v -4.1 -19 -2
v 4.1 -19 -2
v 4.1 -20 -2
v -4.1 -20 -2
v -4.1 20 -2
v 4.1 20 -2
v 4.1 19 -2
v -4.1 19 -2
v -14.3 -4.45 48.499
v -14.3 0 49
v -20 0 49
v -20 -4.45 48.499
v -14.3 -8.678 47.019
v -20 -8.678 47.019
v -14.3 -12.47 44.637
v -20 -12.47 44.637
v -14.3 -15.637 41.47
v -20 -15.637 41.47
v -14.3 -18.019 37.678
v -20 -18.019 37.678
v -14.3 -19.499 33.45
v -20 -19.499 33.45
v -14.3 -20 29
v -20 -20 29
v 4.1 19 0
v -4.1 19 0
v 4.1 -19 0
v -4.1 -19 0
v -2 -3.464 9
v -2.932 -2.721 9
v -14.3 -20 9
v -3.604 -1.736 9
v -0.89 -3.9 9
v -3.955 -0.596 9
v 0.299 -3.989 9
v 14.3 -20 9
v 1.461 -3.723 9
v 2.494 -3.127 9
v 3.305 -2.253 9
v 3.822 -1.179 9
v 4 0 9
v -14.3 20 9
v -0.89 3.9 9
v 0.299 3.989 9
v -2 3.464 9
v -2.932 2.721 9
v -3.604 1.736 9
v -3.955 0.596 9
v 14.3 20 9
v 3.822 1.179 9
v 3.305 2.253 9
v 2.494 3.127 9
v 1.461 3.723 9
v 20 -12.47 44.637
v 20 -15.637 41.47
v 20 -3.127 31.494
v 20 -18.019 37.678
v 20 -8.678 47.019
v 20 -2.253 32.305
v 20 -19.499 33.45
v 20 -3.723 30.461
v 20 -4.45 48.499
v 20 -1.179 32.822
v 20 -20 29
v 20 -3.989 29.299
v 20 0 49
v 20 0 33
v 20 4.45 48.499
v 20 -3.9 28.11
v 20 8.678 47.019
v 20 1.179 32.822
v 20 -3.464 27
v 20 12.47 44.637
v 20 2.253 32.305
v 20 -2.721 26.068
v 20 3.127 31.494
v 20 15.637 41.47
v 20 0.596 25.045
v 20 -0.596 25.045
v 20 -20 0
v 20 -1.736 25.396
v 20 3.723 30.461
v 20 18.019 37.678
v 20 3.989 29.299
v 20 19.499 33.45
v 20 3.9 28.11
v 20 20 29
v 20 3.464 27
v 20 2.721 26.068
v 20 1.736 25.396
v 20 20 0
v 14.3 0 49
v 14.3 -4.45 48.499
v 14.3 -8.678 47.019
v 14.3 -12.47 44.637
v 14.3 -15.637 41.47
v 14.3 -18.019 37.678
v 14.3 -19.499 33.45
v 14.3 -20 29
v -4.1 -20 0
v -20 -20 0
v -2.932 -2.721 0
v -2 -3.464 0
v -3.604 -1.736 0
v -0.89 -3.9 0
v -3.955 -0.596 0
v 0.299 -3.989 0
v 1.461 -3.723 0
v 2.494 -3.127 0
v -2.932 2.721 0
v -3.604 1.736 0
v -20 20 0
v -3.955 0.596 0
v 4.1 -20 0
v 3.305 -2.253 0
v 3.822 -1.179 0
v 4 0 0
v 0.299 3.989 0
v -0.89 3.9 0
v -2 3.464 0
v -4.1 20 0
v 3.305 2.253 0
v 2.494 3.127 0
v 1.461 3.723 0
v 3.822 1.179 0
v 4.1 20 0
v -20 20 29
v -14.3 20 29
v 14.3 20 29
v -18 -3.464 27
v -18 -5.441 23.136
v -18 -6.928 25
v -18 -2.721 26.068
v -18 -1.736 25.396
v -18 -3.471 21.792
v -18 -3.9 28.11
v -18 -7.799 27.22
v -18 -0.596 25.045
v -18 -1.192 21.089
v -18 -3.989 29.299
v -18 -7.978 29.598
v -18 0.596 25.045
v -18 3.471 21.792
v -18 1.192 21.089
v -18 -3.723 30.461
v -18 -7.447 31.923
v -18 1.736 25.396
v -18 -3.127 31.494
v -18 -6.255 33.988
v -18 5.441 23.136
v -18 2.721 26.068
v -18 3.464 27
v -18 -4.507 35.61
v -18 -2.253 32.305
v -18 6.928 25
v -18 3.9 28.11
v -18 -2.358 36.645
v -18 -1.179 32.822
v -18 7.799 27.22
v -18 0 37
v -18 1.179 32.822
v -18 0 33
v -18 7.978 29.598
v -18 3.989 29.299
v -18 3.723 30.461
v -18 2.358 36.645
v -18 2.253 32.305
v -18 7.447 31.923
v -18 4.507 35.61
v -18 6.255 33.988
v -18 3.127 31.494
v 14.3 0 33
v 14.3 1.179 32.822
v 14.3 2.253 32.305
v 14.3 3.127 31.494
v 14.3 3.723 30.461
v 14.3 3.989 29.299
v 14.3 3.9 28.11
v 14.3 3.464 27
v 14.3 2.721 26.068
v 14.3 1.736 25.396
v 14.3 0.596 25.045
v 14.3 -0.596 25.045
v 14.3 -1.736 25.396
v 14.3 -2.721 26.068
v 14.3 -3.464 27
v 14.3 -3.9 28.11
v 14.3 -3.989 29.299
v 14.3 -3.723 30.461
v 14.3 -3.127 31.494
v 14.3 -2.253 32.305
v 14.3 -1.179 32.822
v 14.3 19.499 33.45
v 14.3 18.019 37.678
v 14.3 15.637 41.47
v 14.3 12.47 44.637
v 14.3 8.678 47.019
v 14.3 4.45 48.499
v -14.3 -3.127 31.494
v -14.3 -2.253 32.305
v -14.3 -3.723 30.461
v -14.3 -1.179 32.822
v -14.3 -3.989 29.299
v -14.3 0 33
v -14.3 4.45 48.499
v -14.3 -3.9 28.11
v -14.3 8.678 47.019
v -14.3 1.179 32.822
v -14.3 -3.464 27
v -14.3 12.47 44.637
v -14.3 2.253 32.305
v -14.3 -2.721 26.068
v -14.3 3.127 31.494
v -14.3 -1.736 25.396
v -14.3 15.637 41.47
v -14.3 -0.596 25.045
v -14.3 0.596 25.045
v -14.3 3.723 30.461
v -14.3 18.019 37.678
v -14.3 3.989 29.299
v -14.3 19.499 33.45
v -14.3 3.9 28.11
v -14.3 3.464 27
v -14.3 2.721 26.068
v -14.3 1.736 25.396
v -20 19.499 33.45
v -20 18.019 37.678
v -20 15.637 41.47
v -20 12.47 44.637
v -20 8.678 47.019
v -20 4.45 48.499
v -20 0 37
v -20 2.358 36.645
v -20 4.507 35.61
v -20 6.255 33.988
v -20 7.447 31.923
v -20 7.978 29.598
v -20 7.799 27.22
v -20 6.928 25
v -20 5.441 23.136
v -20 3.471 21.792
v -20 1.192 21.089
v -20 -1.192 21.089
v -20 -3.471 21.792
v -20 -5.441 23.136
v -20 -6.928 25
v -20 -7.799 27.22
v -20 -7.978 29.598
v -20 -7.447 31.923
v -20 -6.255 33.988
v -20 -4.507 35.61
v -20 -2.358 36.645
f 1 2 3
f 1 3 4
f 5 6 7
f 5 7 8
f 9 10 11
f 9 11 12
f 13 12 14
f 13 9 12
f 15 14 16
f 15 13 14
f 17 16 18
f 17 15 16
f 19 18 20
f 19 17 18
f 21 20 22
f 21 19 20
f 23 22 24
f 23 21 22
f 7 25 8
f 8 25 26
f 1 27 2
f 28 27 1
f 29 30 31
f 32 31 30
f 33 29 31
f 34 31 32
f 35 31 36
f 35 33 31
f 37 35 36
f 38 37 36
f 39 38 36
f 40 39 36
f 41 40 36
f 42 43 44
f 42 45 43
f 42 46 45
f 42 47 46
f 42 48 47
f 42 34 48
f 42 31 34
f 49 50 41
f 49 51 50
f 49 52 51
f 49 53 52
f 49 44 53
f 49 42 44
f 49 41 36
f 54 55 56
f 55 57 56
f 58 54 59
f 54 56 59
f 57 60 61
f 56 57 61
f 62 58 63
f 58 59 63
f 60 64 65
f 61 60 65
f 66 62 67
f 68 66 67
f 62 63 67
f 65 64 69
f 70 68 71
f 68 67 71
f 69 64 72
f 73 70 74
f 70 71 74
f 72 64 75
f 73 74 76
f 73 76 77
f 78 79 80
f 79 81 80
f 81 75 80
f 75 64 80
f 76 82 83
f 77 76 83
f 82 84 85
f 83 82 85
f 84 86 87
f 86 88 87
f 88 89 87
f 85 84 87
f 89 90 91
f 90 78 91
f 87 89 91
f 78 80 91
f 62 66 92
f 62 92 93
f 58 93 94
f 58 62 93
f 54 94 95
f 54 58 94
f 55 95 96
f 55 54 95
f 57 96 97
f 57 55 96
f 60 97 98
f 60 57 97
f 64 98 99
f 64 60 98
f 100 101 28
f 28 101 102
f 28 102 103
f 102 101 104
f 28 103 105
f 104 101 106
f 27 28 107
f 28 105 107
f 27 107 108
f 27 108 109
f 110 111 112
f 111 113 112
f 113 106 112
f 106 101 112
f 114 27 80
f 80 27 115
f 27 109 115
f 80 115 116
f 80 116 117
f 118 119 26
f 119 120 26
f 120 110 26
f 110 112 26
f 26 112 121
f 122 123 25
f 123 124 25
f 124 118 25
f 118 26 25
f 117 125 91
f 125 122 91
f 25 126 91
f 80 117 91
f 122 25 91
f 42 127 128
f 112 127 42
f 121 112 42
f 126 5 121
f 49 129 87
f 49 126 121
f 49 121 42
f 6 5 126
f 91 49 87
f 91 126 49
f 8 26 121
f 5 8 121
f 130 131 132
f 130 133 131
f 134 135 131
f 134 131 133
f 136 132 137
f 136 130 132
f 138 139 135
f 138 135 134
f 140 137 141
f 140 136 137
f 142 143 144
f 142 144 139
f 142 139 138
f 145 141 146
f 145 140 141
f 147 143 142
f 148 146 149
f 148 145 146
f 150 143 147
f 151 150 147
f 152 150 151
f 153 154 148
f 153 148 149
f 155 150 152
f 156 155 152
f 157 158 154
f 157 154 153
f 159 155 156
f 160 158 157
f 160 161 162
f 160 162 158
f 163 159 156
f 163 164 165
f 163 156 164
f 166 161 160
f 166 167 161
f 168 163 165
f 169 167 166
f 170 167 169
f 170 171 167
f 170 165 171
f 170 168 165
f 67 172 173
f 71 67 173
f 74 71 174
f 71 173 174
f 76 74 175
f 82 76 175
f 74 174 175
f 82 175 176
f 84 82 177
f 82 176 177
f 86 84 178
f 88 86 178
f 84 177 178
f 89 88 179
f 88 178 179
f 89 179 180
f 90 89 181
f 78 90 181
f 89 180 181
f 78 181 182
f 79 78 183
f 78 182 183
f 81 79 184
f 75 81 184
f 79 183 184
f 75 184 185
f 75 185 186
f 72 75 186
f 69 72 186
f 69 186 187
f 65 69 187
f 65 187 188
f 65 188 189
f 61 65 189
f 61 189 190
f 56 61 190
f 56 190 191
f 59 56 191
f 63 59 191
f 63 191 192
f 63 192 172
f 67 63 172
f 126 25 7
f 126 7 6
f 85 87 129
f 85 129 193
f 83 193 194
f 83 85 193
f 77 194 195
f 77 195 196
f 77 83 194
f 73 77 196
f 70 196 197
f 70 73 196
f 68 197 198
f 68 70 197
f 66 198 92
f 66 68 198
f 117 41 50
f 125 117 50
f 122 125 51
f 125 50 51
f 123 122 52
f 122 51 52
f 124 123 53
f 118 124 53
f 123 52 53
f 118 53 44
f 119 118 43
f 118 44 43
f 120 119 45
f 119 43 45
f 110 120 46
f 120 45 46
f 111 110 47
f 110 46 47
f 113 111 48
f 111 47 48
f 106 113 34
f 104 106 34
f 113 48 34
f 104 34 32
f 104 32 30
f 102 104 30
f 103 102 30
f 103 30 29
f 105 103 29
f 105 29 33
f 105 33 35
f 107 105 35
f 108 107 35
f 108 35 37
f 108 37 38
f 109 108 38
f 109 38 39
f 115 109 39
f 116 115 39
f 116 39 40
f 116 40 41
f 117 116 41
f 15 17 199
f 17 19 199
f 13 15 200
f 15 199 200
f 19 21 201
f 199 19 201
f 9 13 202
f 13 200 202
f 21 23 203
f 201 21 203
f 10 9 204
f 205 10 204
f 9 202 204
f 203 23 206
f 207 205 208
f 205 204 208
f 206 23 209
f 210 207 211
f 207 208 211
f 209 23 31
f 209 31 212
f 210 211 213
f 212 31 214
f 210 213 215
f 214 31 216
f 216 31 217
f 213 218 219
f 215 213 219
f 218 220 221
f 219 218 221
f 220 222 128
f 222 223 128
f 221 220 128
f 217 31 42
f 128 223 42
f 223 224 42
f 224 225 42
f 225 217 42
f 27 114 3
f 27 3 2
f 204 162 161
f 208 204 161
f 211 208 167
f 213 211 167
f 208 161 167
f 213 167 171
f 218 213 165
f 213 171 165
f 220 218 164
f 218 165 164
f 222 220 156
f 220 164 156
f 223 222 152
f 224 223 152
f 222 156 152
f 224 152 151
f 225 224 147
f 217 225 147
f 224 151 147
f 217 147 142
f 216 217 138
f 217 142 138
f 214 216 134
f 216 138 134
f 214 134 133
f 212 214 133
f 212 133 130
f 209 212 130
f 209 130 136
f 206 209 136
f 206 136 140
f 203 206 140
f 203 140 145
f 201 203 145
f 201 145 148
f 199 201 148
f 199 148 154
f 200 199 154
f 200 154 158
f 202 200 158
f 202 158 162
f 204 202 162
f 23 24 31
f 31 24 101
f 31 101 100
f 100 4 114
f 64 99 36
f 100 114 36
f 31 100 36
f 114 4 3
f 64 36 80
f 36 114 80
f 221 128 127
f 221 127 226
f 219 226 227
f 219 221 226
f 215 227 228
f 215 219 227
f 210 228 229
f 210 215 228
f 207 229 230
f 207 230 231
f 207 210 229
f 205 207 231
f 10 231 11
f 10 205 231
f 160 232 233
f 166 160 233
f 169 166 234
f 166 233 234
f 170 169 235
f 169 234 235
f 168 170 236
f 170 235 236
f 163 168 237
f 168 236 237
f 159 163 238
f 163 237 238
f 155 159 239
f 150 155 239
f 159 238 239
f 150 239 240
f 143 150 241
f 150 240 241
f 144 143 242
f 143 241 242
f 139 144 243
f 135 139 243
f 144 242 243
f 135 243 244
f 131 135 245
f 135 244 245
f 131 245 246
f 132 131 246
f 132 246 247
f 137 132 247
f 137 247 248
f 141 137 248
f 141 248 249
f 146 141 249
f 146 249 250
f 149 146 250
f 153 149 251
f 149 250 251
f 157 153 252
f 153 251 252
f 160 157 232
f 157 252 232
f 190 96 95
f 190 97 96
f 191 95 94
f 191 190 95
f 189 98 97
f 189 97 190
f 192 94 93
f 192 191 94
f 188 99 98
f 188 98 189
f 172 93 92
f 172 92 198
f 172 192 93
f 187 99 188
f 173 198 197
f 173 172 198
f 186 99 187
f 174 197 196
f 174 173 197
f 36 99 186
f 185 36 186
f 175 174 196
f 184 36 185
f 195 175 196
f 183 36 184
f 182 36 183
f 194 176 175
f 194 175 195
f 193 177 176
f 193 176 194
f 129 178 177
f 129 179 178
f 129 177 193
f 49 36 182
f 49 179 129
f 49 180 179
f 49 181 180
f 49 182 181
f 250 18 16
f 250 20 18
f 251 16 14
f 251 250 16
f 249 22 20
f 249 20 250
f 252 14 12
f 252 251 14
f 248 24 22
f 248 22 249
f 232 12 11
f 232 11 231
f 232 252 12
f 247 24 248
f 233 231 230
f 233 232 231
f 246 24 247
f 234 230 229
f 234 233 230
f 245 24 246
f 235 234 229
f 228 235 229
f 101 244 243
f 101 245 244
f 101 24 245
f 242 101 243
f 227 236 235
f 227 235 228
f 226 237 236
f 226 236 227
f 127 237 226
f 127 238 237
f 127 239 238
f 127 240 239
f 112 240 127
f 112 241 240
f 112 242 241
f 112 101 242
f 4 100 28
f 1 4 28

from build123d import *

# Parameters (mm, degrees)
SKETCH_1_W          = 40
SKETCH_1_H          = 40
EXTRUDE_1_DEPTH     = 9
SKETCH_2_W          = 5.7
SKETCH_2_H          = 40
EXTRUDE_2_DEPTH     = 40
CUT_EXTRUDE_START   = -40
CUT_EXTRUDE_2_DEPTH = 40
SKETCH_4_R          = 4
CUT_EXTRUDE_3_DEPTH = 67.340033162
SKETCH_5_R          = 8
CUT_EXTRUDE_4_DEPTH = 2
SKETCH_6_R          = 4
CUT_EXTRUDE_5_DEPTH = 49.989794856
SKETCH_7_W          = 8.2
SKETCH_7_H          = 1
EXTRUDE_3_DEPTH     = 2


# Read off the part's stored shape, not the designer's step: 切除-拉伸2
with BuildPart() as part:
    # 草图1 → 凸台-拉伸1 (new body)
    with BuildSketch(Plane.XY):
        Rectangle(SKETCH_1_W, SKETCH_1_H)
    extrude(amount=EXTRUDE_1_DEPTH)

    # 草图2 → 凸台-拉伸2 (add)
    with BuildSketch(Plane.XY.offset(9)):
        with Locations((-17.15, 0)):
            Rectangle(SKETCH_2_W, SKETCH_2_H)
        with Locations((17.15, 0)):
            Rectangle(SKETCH_2_W, SKETCH_2_H)
    extrude(amount=EXTRUDE_2_DEPTH)

    # 切除-拉伸2 outline → 切除-拉伸2 (cut)
    with BuildSketch(Plane.ZY.offset(20).offset(CUT_EXTRUDE_START)):
        with BuildLine():
            Line((49, 20), (29, 20))
            ThreePointArc((29, 20), (43.142135559, 14.142135688), (49, 1.83e-07))
            Line((49, 1.83e-07), (49, 20))
        make_face()
        with BuildLine():
            Line((49, -20), (49, 1.83e-07))
            ThreePointArc((49, 1.83e-07), (43.142135688, -14.142135559), (29, -20))
            Line((29, -20), (49, -20))
        make_face()
    extrude(amount=CUT_EXTRUDE_2_DEPTH, mode=Mode.SUBTRACT)

    # 草图4 → 切除-拉伸3 (cut, through all)
    with BuildSketch(Plane.ZY.offset(20)):
        with Locations((29, 0)):
            Circle(SKETCH_4_R)
    extrude(amount=-CUT_EXTRUDE_3_DEPTH, mode=Mode.SUBTRACT)

    # 草图5 → 切除-拉伸4 (cut)
    with BuildSketch(Plane.ZY.offset(20)):
        with Locations((29, 0)):
            Circle(SKETCH_5_R)
    extrude(amount=-CUT_EXTRUDE_4_DEPTH, mode=Mode.SUBTRACT)

    # 草图6 → 切除-拉伸5 (cut, through all)
    with BuildSketch(Plane.XY.offset(9)):
        Circle(SKETCH_6_R)
    extrude(amount=-CUT_EXTRUDE_5_DEPTH, mode=Mode.SUBTRACT)

    # 草图7 → 凸台-拉伸3 (add)
    with BuildSketch(Plane(origin=(0, 0, 0), x_dir=(-1, 0, 0), z_dir=(0, 0, -1))):
        with Locations((0, 19.5)):
            Rectangle(SKETCH_7_W, SKETCH_7_H)
        with Locations((0, -19.5)):
            Rectangle(SKETCH_7_W, SKETCH_7_H)
    extrude(amount=EXTRUDE_3_DEPTH)


solid = part.part
